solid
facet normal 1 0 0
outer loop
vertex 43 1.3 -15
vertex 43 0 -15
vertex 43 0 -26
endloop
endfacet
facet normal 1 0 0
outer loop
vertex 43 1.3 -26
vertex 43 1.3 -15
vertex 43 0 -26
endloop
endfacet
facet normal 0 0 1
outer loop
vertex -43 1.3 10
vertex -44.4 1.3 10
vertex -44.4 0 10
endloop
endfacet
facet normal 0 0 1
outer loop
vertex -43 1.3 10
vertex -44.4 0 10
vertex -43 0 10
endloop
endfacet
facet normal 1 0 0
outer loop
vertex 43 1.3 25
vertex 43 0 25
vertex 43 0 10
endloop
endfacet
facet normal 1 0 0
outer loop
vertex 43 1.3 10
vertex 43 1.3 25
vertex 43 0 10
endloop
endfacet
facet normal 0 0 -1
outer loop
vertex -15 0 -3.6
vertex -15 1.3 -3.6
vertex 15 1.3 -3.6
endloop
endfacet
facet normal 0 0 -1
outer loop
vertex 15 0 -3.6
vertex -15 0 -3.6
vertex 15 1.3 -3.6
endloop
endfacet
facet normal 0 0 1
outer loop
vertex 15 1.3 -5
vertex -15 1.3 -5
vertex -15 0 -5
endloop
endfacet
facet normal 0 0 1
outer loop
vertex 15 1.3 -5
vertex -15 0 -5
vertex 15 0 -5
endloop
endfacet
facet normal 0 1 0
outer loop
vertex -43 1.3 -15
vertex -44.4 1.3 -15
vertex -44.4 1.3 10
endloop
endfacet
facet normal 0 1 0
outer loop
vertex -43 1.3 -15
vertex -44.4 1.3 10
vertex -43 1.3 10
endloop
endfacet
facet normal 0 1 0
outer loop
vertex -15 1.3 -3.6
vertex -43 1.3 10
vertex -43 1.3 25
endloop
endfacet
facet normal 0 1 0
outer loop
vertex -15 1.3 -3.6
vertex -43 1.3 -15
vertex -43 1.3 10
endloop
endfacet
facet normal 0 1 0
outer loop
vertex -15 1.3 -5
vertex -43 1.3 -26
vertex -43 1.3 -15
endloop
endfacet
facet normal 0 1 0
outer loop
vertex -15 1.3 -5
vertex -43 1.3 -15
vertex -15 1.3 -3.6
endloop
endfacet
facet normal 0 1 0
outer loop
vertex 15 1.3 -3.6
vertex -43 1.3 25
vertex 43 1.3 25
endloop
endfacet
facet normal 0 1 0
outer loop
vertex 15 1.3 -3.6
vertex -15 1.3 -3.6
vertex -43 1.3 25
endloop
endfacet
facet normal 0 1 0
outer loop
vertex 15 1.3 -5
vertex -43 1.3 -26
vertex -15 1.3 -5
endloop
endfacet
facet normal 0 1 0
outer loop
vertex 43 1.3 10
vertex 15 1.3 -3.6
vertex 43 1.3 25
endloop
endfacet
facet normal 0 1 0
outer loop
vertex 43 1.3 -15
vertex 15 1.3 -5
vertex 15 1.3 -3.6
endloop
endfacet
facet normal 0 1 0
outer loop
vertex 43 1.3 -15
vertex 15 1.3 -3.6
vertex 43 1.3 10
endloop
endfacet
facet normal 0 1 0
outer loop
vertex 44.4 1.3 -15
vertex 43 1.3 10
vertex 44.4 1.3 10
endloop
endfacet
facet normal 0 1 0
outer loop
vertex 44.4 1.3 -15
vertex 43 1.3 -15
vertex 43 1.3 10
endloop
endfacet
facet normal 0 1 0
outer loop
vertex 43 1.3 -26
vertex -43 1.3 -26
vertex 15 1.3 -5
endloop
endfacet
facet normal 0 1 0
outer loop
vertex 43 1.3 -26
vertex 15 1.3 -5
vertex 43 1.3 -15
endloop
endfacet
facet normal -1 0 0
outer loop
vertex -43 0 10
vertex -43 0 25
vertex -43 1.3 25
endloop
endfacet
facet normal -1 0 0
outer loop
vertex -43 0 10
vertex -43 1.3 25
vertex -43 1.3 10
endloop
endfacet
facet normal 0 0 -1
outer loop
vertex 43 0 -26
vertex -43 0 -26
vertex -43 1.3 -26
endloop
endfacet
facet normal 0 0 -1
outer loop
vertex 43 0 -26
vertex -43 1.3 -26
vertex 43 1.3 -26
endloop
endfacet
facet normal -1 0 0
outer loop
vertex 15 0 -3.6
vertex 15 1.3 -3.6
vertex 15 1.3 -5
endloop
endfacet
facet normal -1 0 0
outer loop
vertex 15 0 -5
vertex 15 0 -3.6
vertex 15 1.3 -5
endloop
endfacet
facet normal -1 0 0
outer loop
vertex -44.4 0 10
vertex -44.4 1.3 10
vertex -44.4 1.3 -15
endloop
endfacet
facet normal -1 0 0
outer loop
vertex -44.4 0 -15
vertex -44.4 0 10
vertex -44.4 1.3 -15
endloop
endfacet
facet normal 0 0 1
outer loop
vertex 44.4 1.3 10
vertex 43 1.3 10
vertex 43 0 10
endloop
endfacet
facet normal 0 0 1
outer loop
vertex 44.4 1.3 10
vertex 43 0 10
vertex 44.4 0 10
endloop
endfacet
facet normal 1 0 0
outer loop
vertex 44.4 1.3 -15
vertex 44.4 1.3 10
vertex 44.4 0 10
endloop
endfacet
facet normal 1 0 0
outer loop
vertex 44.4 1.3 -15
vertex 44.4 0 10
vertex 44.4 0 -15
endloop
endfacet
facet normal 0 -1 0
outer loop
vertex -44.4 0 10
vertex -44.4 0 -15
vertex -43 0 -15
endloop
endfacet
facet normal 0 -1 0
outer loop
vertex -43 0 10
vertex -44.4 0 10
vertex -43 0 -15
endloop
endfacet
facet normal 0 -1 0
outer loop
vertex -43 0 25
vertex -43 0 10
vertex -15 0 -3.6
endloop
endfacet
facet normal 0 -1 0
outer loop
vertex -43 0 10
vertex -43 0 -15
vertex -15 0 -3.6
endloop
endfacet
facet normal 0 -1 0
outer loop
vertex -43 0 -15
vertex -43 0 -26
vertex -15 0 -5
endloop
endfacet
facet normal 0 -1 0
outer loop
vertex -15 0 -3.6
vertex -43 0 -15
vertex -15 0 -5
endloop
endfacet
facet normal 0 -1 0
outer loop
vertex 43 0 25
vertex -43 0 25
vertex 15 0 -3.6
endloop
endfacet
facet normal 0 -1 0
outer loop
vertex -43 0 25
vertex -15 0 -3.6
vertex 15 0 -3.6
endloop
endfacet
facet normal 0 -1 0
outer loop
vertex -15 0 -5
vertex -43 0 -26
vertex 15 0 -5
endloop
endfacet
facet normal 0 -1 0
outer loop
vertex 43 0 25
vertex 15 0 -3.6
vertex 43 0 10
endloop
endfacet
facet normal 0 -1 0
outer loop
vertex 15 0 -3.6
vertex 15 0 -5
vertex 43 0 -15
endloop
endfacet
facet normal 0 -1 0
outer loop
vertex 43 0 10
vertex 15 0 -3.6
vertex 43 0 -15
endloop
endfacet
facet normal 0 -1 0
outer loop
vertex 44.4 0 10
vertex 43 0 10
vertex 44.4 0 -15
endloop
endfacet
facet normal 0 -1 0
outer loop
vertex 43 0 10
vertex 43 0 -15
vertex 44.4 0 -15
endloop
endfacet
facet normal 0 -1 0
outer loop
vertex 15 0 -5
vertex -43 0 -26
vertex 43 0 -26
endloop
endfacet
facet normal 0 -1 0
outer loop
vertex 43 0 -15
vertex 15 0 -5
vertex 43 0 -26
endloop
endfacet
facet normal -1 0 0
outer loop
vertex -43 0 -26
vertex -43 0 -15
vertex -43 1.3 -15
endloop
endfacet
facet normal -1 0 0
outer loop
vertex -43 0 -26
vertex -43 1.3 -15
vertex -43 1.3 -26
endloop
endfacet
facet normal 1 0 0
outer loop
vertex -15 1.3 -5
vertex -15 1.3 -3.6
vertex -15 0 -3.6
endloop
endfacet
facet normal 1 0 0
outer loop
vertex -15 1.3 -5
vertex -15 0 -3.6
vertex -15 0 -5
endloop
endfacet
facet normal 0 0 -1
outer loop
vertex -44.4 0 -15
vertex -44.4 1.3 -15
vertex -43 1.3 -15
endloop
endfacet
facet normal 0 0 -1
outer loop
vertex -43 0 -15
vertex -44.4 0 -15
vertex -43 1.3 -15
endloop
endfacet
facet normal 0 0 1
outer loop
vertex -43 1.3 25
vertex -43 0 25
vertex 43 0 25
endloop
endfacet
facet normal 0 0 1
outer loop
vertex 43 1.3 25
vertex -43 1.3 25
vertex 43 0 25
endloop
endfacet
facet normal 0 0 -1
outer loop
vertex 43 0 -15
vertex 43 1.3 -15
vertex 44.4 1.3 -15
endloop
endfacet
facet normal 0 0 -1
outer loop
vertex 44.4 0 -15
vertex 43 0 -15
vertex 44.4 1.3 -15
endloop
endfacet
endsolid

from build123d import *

# Parameters (mm, degrees)
SKETCH1_W           = 86
SKETCH1_H           = 50
BOSS_EXTRUDE1_DEPTH = 1.3
SKETCH2_W           = 1.4
SKETCH2_H           = 25
BOSS_EXTRUDE2_DEPTH = 1.3
SKETCH3_W           = 30
SKETCH3_H           = 1.4
CUT_EXTRUDE1_DEPTH  = 51.971070226
SKETCH4_W           = 86
SKETCH4_H           = 1
BOSS_EXTRUDE3_DEPTH = 1.3


with BuildPart() as part:
    # Sketch1 → Boss-Extrude1 (new body)
    with BuildSketch(Plane(origin=(0, 0, 0), x_dir=(1, 0, 0), z_dir=(0, 1, 0))):
        Rectangle(SKETCH1_W, SKETCH1_H)
    extrude(amount=BOSS_EXTRUDE1_DEPTH)

    # Sketch2 → Boss-Extrude2 (add)
    with BuildSketch(Plane(origin=(0, 1.3, 0), x_dir=(1, 0, 0), z_dir=(0, 1, 0))):
        with Locations((-43.7, 2.5)):
            Rectangle(SKETCH2_W, SKETCH2_H)
        with Locations((43.7, 2.5)):
            Rectangle(SKETCH2_W, SKETCH2_H)
    extrude(amount=-BOSS_EXTRUDE2_DEPTH)

    # Sketch3 → Cut-Extrude1 (cut, through all)
    with BuildSketch(Plane(origin=(0, 1.3, 0), x_dir=(1, 0, 0), z_dir=(0, 1, 0))):
        with Locations((0, 4.3)):
            Rectangle(SKETCH3_W, SKETCH3_H)
    extrude(amount=-CUT_EXTRUDE1_DEPTH, mode=Mode.SUBTRACT)

    # Sketch4 → Boss-Extrude3 (add)
    with BuildSketch(Plane(origin=(0, 0, 0), x_dir=(1, 0, 0), z_dir=(0, 1, 0))):
        with Locations((0, 25.5)):
            Rectangle(SKETCH4_W, SKETCH4_H)
    extrude(amount=BOSS_EXTRUDE3_DEPTH)


solid = part.part
